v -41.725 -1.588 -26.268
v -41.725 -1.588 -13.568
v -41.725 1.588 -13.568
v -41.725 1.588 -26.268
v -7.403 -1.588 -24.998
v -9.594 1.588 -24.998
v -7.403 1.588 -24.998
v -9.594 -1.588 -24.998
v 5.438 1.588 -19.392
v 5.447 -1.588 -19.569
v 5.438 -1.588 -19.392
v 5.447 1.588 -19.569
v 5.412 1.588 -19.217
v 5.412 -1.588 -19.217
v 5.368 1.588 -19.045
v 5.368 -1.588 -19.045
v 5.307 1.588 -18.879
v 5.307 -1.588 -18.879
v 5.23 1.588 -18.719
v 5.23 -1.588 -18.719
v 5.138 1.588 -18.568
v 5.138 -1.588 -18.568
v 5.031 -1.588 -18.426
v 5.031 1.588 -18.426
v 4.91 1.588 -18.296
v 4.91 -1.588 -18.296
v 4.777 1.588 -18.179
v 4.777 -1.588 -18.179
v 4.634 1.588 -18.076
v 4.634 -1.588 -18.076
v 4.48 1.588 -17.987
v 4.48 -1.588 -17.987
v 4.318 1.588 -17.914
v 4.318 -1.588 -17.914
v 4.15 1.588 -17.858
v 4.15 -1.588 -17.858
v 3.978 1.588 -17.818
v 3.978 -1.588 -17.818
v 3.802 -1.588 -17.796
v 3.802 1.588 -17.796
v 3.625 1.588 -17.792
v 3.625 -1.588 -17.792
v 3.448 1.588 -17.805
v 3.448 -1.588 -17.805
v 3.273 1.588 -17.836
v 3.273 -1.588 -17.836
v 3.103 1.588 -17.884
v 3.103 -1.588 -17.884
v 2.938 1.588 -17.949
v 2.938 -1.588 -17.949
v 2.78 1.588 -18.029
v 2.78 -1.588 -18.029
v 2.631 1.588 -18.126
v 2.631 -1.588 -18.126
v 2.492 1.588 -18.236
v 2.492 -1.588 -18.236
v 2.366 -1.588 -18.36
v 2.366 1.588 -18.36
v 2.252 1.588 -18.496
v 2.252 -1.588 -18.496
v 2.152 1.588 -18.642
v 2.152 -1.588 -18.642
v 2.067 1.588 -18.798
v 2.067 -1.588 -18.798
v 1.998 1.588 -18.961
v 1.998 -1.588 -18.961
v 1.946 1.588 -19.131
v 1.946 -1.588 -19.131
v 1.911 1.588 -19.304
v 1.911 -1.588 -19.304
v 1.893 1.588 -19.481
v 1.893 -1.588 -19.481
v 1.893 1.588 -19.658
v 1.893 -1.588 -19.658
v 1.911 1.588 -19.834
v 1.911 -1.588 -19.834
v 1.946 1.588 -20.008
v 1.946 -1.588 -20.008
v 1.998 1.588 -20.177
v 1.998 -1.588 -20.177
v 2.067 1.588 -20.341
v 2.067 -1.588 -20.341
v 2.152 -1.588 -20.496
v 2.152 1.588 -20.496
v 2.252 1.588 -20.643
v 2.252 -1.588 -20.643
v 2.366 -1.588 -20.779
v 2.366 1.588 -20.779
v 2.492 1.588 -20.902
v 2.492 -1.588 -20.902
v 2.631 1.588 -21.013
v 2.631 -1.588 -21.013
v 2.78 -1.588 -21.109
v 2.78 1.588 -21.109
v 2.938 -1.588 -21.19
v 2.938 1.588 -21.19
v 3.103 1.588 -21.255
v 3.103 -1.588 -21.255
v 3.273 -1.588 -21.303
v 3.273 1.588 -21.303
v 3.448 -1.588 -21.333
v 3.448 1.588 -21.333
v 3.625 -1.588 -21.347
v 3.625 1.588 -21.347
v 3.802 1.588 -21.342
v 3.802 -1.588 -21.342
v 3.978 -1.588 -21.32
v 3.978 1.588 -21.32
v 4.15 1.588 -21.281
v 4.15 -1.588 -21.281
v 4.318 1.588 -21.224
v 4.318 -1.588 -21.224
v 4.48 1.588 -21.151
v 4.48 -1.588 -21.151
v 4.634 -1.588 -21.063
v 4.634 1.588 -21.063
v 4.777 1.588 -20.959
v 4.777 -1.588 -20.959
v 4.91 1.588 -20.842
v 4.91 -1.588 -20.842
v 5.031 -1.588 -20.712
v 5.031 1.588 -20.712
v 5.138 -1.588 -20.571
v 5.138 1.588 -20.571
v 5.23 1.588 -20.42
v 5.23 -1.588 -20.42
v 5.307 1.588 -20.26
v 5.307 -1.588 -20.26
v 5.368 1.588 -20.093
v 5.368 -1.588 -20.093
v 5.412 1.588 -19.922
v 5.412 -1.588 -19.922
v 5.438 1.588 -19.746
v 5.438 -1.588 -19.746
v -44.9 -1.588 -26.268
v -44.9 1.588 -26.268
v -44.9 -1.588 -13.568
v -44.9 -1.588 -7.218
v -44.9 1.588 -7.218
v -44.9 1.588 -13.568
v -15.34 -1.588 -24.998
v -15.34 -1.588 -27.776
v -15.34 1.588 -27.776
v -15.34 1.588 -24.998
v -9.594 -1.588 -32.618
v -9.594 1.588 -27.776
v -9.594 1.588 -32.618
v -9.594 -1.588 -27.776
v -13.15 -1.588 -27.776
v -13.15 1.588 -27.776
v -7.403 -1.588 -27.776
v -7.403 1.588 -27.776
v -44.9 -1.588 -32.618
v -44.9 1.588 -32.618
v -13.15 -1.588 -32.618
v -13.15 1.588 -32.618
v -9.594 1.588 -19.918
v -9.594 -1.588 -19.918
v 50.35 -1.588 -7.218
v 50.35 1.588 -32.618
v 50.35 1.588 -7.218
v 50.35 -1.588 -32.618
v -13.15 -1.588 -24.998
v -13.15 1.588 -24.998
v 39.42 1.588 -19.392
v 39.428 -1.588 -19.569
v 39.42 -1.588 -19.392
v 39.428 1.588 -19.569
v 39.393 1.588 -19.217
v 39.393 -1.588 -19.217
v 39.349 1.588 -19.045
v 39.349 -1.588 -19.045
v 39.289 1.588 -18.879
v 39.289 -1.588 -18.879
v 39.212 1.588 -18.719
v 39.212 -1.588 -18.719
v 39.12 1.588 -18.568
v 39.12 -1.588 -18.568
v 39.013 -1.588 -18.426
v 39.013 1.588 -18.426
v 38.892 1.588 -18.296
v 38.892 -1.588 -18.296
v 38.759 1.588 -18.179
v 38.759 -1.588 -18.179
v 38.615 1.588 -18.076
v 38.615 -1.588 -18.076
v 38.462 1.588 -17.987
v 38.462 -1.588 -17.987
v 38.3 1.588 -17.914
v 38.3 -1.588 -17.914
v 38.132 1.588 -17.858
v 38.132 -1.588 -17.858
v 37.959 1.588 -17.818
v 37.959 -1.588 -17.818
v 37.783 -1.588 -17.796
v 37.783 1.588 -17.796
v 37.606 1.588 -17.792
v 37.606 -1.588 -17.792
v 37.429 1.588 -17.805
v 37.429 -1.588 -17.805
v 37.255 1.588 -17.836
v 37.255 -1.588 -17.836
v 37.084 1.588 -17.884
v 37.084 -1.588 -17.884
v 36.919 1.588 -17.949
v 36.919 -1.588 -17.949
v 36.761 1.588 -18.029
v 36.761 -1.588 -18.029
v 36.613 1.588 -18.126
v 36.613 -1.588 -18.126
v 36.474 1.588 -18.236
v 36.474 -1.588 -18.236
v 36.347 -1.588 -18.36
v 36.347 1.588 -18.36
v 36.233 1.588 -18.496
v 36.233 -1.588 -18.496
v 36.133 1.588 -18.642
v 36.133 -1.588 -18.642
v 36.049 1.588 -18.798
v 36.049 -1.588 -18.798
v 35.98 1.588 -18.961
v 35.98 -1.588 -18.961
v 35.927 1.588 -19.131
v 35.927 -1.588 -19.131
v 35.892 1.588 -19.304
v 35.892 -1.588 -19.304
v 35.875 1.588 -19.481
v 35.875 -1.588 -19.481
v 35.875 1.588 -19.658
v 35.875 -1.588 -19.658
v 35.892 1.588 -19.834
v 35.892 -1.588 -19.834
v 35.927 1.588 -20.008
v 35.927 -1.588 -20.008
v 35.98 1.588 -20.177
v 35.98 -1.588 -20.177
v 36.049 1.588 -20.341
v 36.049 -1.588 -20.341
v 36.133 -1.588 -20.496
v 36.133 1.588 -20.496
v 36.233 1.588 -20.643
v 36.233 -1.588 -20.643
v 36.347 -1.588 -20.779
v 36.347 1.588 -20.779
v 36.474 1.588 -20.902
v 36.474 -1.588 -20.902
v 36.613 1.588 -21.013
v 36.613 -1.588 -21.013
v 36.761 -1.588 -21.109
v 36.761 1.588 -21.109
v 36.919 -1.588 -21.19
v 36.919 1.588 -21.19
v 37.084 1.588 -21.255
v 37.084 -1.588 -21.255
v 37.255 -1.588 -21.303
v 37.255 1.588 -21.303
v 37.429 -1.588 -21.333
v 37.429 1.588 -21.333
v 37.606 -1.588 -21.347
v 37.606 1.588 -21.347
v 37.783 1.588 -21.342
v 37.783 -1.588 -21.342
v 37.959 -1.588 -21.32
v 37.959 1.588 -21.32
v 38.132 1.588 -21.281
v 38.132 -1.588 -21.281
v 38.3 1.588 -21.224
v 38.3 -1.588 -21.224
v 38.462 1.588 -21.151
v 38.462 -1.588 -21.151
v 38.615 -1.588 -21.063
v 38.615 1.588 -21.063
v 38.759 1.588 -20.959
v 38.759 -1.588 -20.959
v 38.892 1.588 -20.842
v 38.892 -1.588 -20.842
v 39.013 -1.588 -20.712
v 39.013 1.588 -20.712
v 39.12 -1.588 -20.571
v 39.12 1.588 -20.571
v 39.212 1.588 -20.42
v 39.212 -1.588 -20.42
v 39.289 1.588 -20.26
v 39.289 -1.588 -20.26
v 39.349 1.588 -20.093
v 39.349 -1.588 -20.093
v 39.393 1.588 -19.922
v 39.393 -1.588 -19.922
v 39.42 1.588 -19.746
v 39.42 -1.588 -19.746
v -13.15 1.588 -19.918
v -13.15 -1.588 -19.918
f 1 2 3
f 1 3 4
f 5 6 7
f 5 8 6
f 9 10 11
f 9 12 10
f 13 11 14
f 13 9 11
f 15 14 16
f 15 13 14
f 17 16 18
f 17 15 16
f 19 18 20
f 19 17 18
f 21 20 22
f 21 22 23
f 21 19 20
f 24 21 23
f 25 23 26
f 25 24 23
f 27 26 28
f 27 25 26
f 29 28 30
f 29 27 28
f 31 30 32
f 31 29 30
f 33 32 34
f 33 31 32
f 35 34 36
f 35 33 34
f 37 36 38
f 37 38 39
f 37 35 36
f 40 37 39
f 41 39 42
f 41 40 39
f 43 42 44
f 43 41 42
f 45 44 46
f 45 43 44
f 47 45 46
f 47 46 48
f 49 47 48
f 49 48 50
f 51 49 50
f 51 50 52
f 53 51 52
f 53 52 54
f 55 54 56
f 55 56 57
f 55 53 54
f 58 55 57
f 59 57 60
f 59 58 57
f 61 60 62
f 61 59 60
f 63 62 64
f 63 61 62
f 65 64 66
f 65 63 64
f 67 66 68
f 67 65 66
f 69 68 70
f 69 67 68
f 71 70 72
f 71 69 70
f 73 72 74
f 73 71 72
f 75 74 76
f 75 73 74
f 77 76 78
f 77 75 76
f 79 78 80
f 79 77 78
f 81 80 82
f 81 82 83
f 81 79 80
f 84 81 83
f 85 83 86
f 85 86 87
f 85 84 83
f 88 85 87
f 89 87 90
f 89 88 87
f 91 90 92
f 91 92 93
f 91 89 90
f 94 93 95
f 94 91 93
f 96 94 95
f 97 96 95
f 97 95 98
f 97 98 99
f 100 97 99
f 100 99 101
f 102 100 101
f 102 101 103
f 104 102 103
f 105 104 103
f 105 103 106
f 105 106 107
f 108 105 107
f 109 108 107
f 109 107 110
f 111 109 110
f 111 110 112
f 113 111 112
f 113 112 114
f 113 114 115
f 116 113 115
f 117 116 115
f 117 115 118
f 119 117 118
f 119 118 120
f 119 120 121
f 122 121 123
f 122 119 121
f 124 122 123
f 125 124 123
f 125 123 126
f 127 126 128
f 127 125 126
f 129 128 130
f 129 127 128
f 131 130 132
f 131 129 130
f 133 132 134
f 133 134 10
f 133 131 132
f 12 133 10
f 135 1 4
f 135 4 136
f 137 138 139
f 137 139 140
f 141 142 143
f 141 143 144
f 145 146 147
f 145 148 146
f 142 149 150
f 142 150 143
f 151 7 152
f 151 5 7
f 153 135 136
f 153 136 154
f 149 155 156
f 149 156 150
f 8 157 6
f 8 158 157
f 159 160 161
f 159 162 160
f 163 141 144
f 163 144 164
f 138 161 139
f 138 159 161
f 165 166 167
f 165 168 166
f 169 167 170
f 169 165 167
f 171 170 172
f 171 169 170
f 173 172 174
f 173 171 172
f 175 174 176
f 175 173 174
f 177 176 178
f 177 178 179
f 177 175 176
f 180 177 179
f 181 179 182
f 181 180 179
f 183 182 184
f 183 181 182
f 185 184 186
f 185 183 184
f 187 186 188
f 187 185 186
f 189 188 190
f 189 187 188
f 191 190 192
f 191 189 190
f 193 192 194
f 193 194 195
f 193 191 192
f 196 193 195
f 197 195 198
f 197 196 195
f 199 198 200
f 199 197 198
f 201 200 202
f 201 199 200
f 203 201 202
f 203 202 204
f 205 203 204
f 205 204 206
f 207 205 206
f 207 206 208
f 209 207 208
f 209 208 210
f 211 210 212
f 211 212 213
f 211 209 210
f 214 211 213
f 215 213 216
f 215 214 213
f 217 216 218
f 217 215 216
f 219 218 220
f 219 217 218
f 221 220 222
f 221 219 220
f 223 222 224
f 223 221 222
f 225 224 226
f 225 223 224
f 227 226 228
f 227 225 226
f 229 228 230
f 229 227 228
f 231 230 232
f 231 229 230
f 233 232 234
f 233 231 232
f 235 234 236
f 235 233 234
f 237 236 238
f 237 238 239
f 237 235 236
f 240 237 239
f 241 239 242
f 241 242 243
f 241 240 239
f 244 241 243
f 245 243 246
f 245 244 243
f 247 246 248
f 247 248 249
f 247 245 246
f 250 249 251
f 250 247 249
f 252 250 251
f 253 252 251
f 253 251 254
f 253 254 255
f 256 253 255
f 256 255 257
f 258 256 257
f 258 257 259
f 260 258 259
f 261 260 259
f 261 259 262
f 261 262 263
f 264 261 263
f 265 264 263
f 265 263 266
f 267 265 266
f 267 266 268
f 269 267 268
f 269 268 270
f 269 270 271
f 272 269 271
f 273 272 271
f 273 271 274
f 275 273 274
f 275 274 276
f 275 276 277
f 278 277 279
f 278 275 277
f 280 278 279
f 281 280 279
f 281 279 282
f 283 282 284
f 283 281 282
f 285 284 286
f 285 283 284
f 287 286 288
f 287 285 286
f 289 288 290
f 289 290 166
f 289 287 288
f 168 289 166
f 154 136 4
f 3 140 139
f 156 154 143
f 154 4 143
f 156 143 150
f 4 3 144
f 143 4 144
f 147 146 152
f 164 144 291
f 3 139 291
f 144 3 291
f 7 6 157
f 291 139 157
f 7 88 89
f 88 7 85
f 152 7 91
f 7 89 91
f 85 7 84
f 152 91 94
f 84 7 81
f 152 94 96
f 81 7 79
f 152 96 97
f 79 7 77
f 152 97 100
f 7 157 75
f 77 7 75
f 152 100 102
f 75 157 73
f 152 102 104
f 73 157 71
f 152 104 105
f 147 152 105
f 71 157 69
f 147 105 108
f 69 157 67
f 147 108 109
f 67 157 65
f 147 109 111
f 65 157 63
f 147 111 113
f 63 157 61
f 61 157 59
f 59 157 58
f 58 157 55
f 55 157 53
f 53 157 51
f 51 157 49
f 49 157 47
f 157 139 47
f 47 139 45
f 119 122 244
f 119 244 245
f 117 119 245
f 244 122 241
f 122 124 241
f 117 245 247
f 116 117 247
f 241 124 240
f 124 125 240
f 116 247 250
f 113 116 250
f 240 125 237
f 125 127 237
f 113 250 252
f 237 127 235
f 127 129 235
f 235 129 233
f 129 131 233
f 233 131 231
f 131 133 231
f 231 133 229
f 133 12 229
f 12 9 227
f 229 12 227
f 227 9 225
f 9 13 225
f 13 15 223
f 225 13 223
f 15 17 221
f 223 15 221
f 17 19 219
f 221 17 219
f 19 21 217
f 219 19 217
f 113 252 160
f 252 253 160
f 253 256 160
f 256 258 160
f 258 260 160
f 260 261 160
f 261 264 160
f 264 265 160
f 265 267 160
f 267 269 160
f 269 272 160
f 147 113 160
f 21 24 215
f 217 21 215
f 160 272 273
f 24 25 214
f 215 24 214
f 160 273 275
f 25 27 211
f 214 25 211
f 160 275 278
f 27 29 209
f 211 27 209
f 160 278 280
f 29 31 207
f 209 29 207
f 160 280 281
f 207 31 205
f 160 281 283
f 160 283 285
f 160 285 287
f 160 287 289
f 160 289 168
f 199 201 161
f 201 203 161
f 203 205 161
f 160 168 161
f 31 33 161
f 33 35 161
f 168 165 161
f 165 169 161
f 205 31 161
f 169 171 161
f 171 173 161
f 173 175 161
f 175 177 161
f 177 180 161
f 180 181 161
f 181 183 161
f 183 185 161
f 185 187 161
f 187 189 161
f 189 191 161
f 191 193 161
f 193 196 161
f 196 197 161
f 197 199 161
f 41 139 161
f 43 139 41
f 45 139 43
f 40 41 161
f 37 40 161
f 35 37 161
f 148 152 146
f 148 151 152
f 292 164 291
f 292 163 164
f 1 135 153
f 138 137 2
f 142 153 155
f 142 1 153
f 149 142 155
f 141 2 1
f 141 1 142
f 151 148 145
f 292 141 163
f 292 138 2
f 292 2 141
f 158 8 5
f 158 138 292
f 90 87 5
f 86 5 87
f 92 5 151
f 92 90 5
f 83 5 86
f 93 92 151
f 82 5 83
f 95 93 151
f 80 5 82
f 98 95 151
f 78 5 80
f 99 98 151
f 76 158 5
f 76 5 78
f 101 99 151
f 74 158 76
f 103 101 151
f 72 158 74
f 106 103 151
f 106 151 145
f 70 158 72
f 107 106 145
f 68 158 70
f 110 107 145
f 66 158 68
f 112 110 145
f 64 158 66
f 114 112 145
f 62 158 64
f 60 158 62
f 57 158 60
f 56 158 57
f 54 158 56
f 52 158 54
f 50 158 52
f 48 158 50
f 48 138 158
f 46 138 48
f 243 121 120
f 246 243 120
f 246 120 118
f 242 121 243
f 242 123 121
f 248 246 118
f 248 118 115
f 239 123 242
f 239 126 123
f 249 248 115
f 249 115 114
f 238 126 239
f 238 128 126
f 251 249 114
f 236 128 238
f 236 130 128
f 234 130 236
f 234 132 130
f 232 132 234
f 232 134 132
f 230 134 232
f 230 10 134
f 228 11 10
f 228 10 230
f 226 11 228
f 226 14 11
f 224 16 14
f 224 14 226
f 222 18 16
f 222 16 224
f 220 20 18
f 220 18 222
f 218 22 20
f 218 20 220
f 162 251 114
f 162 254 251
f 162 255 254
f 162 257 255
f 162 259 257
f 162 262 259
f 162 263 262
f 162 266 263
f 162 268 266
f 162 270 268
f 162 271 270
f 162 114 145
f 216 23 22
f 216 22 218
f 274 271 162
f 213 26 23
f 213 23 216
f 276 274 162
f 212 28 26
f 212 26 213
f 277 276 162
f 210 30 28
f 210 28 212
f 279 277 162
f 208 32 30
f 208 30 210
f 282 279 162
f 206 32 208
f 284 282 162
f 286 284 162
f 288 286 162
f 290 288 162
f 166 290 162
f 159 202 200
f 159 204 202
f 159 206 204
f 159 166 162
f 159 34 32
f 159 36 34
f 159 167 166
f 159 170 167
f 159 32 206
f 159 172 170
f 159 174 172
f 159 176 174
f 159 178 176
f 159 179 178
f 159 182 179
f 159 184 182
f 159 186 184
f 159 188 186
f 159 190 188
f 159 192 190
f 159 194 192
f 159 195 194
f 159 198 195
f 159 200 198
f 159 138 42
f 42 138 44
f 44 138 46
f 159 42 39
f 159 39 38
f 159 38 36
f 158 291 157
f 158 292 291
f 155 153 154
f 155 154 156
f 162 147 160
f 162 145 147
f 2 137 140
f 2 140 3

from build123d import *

# Parameters (mm, degrees)
F0_R     = 1.778
F1_DEPTH = 1.5875


with BuildPart() as f1:
    # F0 (on Front) → F1 (new body, symmetric)
    with BuildSketch(Plane.XZ):
        Polygon((50.350482, -7.217964), (-44.899518, -7.217964), (-44.899518, -13.567964), (-41.724518, -13.567964), (-41.724518, -26.267964), (-44.899518, -26.267964), (-44.899518, -32.617964), (-13.149518, -32.617964), (-13.149518, -27.776089), (-15.340268, -27.776089), (-15.340268, -24.997964), (-13.149518, -24.997964), (-13.149518, -19.917964), (-9.593518, -19.917964), (-9.593518, -24.997964), (-7.402768, -24.997964), (-7.402768, -27.776089), (-9.593518, -27.776089), (-9.593518, -32.617964), (50.350482, -32.617964), align=None)
        with Locations((3.668914, -19.569241)):
            Circle(F0_R, mode=Mode.SUBTRACT)
        with Locations((37.650482, -19.569241)):
            Circle(F0_R, mode=Mode.SUBTRACT)
    extrude(amount=F1_DEPTH, both=True)


solid = f1.part
